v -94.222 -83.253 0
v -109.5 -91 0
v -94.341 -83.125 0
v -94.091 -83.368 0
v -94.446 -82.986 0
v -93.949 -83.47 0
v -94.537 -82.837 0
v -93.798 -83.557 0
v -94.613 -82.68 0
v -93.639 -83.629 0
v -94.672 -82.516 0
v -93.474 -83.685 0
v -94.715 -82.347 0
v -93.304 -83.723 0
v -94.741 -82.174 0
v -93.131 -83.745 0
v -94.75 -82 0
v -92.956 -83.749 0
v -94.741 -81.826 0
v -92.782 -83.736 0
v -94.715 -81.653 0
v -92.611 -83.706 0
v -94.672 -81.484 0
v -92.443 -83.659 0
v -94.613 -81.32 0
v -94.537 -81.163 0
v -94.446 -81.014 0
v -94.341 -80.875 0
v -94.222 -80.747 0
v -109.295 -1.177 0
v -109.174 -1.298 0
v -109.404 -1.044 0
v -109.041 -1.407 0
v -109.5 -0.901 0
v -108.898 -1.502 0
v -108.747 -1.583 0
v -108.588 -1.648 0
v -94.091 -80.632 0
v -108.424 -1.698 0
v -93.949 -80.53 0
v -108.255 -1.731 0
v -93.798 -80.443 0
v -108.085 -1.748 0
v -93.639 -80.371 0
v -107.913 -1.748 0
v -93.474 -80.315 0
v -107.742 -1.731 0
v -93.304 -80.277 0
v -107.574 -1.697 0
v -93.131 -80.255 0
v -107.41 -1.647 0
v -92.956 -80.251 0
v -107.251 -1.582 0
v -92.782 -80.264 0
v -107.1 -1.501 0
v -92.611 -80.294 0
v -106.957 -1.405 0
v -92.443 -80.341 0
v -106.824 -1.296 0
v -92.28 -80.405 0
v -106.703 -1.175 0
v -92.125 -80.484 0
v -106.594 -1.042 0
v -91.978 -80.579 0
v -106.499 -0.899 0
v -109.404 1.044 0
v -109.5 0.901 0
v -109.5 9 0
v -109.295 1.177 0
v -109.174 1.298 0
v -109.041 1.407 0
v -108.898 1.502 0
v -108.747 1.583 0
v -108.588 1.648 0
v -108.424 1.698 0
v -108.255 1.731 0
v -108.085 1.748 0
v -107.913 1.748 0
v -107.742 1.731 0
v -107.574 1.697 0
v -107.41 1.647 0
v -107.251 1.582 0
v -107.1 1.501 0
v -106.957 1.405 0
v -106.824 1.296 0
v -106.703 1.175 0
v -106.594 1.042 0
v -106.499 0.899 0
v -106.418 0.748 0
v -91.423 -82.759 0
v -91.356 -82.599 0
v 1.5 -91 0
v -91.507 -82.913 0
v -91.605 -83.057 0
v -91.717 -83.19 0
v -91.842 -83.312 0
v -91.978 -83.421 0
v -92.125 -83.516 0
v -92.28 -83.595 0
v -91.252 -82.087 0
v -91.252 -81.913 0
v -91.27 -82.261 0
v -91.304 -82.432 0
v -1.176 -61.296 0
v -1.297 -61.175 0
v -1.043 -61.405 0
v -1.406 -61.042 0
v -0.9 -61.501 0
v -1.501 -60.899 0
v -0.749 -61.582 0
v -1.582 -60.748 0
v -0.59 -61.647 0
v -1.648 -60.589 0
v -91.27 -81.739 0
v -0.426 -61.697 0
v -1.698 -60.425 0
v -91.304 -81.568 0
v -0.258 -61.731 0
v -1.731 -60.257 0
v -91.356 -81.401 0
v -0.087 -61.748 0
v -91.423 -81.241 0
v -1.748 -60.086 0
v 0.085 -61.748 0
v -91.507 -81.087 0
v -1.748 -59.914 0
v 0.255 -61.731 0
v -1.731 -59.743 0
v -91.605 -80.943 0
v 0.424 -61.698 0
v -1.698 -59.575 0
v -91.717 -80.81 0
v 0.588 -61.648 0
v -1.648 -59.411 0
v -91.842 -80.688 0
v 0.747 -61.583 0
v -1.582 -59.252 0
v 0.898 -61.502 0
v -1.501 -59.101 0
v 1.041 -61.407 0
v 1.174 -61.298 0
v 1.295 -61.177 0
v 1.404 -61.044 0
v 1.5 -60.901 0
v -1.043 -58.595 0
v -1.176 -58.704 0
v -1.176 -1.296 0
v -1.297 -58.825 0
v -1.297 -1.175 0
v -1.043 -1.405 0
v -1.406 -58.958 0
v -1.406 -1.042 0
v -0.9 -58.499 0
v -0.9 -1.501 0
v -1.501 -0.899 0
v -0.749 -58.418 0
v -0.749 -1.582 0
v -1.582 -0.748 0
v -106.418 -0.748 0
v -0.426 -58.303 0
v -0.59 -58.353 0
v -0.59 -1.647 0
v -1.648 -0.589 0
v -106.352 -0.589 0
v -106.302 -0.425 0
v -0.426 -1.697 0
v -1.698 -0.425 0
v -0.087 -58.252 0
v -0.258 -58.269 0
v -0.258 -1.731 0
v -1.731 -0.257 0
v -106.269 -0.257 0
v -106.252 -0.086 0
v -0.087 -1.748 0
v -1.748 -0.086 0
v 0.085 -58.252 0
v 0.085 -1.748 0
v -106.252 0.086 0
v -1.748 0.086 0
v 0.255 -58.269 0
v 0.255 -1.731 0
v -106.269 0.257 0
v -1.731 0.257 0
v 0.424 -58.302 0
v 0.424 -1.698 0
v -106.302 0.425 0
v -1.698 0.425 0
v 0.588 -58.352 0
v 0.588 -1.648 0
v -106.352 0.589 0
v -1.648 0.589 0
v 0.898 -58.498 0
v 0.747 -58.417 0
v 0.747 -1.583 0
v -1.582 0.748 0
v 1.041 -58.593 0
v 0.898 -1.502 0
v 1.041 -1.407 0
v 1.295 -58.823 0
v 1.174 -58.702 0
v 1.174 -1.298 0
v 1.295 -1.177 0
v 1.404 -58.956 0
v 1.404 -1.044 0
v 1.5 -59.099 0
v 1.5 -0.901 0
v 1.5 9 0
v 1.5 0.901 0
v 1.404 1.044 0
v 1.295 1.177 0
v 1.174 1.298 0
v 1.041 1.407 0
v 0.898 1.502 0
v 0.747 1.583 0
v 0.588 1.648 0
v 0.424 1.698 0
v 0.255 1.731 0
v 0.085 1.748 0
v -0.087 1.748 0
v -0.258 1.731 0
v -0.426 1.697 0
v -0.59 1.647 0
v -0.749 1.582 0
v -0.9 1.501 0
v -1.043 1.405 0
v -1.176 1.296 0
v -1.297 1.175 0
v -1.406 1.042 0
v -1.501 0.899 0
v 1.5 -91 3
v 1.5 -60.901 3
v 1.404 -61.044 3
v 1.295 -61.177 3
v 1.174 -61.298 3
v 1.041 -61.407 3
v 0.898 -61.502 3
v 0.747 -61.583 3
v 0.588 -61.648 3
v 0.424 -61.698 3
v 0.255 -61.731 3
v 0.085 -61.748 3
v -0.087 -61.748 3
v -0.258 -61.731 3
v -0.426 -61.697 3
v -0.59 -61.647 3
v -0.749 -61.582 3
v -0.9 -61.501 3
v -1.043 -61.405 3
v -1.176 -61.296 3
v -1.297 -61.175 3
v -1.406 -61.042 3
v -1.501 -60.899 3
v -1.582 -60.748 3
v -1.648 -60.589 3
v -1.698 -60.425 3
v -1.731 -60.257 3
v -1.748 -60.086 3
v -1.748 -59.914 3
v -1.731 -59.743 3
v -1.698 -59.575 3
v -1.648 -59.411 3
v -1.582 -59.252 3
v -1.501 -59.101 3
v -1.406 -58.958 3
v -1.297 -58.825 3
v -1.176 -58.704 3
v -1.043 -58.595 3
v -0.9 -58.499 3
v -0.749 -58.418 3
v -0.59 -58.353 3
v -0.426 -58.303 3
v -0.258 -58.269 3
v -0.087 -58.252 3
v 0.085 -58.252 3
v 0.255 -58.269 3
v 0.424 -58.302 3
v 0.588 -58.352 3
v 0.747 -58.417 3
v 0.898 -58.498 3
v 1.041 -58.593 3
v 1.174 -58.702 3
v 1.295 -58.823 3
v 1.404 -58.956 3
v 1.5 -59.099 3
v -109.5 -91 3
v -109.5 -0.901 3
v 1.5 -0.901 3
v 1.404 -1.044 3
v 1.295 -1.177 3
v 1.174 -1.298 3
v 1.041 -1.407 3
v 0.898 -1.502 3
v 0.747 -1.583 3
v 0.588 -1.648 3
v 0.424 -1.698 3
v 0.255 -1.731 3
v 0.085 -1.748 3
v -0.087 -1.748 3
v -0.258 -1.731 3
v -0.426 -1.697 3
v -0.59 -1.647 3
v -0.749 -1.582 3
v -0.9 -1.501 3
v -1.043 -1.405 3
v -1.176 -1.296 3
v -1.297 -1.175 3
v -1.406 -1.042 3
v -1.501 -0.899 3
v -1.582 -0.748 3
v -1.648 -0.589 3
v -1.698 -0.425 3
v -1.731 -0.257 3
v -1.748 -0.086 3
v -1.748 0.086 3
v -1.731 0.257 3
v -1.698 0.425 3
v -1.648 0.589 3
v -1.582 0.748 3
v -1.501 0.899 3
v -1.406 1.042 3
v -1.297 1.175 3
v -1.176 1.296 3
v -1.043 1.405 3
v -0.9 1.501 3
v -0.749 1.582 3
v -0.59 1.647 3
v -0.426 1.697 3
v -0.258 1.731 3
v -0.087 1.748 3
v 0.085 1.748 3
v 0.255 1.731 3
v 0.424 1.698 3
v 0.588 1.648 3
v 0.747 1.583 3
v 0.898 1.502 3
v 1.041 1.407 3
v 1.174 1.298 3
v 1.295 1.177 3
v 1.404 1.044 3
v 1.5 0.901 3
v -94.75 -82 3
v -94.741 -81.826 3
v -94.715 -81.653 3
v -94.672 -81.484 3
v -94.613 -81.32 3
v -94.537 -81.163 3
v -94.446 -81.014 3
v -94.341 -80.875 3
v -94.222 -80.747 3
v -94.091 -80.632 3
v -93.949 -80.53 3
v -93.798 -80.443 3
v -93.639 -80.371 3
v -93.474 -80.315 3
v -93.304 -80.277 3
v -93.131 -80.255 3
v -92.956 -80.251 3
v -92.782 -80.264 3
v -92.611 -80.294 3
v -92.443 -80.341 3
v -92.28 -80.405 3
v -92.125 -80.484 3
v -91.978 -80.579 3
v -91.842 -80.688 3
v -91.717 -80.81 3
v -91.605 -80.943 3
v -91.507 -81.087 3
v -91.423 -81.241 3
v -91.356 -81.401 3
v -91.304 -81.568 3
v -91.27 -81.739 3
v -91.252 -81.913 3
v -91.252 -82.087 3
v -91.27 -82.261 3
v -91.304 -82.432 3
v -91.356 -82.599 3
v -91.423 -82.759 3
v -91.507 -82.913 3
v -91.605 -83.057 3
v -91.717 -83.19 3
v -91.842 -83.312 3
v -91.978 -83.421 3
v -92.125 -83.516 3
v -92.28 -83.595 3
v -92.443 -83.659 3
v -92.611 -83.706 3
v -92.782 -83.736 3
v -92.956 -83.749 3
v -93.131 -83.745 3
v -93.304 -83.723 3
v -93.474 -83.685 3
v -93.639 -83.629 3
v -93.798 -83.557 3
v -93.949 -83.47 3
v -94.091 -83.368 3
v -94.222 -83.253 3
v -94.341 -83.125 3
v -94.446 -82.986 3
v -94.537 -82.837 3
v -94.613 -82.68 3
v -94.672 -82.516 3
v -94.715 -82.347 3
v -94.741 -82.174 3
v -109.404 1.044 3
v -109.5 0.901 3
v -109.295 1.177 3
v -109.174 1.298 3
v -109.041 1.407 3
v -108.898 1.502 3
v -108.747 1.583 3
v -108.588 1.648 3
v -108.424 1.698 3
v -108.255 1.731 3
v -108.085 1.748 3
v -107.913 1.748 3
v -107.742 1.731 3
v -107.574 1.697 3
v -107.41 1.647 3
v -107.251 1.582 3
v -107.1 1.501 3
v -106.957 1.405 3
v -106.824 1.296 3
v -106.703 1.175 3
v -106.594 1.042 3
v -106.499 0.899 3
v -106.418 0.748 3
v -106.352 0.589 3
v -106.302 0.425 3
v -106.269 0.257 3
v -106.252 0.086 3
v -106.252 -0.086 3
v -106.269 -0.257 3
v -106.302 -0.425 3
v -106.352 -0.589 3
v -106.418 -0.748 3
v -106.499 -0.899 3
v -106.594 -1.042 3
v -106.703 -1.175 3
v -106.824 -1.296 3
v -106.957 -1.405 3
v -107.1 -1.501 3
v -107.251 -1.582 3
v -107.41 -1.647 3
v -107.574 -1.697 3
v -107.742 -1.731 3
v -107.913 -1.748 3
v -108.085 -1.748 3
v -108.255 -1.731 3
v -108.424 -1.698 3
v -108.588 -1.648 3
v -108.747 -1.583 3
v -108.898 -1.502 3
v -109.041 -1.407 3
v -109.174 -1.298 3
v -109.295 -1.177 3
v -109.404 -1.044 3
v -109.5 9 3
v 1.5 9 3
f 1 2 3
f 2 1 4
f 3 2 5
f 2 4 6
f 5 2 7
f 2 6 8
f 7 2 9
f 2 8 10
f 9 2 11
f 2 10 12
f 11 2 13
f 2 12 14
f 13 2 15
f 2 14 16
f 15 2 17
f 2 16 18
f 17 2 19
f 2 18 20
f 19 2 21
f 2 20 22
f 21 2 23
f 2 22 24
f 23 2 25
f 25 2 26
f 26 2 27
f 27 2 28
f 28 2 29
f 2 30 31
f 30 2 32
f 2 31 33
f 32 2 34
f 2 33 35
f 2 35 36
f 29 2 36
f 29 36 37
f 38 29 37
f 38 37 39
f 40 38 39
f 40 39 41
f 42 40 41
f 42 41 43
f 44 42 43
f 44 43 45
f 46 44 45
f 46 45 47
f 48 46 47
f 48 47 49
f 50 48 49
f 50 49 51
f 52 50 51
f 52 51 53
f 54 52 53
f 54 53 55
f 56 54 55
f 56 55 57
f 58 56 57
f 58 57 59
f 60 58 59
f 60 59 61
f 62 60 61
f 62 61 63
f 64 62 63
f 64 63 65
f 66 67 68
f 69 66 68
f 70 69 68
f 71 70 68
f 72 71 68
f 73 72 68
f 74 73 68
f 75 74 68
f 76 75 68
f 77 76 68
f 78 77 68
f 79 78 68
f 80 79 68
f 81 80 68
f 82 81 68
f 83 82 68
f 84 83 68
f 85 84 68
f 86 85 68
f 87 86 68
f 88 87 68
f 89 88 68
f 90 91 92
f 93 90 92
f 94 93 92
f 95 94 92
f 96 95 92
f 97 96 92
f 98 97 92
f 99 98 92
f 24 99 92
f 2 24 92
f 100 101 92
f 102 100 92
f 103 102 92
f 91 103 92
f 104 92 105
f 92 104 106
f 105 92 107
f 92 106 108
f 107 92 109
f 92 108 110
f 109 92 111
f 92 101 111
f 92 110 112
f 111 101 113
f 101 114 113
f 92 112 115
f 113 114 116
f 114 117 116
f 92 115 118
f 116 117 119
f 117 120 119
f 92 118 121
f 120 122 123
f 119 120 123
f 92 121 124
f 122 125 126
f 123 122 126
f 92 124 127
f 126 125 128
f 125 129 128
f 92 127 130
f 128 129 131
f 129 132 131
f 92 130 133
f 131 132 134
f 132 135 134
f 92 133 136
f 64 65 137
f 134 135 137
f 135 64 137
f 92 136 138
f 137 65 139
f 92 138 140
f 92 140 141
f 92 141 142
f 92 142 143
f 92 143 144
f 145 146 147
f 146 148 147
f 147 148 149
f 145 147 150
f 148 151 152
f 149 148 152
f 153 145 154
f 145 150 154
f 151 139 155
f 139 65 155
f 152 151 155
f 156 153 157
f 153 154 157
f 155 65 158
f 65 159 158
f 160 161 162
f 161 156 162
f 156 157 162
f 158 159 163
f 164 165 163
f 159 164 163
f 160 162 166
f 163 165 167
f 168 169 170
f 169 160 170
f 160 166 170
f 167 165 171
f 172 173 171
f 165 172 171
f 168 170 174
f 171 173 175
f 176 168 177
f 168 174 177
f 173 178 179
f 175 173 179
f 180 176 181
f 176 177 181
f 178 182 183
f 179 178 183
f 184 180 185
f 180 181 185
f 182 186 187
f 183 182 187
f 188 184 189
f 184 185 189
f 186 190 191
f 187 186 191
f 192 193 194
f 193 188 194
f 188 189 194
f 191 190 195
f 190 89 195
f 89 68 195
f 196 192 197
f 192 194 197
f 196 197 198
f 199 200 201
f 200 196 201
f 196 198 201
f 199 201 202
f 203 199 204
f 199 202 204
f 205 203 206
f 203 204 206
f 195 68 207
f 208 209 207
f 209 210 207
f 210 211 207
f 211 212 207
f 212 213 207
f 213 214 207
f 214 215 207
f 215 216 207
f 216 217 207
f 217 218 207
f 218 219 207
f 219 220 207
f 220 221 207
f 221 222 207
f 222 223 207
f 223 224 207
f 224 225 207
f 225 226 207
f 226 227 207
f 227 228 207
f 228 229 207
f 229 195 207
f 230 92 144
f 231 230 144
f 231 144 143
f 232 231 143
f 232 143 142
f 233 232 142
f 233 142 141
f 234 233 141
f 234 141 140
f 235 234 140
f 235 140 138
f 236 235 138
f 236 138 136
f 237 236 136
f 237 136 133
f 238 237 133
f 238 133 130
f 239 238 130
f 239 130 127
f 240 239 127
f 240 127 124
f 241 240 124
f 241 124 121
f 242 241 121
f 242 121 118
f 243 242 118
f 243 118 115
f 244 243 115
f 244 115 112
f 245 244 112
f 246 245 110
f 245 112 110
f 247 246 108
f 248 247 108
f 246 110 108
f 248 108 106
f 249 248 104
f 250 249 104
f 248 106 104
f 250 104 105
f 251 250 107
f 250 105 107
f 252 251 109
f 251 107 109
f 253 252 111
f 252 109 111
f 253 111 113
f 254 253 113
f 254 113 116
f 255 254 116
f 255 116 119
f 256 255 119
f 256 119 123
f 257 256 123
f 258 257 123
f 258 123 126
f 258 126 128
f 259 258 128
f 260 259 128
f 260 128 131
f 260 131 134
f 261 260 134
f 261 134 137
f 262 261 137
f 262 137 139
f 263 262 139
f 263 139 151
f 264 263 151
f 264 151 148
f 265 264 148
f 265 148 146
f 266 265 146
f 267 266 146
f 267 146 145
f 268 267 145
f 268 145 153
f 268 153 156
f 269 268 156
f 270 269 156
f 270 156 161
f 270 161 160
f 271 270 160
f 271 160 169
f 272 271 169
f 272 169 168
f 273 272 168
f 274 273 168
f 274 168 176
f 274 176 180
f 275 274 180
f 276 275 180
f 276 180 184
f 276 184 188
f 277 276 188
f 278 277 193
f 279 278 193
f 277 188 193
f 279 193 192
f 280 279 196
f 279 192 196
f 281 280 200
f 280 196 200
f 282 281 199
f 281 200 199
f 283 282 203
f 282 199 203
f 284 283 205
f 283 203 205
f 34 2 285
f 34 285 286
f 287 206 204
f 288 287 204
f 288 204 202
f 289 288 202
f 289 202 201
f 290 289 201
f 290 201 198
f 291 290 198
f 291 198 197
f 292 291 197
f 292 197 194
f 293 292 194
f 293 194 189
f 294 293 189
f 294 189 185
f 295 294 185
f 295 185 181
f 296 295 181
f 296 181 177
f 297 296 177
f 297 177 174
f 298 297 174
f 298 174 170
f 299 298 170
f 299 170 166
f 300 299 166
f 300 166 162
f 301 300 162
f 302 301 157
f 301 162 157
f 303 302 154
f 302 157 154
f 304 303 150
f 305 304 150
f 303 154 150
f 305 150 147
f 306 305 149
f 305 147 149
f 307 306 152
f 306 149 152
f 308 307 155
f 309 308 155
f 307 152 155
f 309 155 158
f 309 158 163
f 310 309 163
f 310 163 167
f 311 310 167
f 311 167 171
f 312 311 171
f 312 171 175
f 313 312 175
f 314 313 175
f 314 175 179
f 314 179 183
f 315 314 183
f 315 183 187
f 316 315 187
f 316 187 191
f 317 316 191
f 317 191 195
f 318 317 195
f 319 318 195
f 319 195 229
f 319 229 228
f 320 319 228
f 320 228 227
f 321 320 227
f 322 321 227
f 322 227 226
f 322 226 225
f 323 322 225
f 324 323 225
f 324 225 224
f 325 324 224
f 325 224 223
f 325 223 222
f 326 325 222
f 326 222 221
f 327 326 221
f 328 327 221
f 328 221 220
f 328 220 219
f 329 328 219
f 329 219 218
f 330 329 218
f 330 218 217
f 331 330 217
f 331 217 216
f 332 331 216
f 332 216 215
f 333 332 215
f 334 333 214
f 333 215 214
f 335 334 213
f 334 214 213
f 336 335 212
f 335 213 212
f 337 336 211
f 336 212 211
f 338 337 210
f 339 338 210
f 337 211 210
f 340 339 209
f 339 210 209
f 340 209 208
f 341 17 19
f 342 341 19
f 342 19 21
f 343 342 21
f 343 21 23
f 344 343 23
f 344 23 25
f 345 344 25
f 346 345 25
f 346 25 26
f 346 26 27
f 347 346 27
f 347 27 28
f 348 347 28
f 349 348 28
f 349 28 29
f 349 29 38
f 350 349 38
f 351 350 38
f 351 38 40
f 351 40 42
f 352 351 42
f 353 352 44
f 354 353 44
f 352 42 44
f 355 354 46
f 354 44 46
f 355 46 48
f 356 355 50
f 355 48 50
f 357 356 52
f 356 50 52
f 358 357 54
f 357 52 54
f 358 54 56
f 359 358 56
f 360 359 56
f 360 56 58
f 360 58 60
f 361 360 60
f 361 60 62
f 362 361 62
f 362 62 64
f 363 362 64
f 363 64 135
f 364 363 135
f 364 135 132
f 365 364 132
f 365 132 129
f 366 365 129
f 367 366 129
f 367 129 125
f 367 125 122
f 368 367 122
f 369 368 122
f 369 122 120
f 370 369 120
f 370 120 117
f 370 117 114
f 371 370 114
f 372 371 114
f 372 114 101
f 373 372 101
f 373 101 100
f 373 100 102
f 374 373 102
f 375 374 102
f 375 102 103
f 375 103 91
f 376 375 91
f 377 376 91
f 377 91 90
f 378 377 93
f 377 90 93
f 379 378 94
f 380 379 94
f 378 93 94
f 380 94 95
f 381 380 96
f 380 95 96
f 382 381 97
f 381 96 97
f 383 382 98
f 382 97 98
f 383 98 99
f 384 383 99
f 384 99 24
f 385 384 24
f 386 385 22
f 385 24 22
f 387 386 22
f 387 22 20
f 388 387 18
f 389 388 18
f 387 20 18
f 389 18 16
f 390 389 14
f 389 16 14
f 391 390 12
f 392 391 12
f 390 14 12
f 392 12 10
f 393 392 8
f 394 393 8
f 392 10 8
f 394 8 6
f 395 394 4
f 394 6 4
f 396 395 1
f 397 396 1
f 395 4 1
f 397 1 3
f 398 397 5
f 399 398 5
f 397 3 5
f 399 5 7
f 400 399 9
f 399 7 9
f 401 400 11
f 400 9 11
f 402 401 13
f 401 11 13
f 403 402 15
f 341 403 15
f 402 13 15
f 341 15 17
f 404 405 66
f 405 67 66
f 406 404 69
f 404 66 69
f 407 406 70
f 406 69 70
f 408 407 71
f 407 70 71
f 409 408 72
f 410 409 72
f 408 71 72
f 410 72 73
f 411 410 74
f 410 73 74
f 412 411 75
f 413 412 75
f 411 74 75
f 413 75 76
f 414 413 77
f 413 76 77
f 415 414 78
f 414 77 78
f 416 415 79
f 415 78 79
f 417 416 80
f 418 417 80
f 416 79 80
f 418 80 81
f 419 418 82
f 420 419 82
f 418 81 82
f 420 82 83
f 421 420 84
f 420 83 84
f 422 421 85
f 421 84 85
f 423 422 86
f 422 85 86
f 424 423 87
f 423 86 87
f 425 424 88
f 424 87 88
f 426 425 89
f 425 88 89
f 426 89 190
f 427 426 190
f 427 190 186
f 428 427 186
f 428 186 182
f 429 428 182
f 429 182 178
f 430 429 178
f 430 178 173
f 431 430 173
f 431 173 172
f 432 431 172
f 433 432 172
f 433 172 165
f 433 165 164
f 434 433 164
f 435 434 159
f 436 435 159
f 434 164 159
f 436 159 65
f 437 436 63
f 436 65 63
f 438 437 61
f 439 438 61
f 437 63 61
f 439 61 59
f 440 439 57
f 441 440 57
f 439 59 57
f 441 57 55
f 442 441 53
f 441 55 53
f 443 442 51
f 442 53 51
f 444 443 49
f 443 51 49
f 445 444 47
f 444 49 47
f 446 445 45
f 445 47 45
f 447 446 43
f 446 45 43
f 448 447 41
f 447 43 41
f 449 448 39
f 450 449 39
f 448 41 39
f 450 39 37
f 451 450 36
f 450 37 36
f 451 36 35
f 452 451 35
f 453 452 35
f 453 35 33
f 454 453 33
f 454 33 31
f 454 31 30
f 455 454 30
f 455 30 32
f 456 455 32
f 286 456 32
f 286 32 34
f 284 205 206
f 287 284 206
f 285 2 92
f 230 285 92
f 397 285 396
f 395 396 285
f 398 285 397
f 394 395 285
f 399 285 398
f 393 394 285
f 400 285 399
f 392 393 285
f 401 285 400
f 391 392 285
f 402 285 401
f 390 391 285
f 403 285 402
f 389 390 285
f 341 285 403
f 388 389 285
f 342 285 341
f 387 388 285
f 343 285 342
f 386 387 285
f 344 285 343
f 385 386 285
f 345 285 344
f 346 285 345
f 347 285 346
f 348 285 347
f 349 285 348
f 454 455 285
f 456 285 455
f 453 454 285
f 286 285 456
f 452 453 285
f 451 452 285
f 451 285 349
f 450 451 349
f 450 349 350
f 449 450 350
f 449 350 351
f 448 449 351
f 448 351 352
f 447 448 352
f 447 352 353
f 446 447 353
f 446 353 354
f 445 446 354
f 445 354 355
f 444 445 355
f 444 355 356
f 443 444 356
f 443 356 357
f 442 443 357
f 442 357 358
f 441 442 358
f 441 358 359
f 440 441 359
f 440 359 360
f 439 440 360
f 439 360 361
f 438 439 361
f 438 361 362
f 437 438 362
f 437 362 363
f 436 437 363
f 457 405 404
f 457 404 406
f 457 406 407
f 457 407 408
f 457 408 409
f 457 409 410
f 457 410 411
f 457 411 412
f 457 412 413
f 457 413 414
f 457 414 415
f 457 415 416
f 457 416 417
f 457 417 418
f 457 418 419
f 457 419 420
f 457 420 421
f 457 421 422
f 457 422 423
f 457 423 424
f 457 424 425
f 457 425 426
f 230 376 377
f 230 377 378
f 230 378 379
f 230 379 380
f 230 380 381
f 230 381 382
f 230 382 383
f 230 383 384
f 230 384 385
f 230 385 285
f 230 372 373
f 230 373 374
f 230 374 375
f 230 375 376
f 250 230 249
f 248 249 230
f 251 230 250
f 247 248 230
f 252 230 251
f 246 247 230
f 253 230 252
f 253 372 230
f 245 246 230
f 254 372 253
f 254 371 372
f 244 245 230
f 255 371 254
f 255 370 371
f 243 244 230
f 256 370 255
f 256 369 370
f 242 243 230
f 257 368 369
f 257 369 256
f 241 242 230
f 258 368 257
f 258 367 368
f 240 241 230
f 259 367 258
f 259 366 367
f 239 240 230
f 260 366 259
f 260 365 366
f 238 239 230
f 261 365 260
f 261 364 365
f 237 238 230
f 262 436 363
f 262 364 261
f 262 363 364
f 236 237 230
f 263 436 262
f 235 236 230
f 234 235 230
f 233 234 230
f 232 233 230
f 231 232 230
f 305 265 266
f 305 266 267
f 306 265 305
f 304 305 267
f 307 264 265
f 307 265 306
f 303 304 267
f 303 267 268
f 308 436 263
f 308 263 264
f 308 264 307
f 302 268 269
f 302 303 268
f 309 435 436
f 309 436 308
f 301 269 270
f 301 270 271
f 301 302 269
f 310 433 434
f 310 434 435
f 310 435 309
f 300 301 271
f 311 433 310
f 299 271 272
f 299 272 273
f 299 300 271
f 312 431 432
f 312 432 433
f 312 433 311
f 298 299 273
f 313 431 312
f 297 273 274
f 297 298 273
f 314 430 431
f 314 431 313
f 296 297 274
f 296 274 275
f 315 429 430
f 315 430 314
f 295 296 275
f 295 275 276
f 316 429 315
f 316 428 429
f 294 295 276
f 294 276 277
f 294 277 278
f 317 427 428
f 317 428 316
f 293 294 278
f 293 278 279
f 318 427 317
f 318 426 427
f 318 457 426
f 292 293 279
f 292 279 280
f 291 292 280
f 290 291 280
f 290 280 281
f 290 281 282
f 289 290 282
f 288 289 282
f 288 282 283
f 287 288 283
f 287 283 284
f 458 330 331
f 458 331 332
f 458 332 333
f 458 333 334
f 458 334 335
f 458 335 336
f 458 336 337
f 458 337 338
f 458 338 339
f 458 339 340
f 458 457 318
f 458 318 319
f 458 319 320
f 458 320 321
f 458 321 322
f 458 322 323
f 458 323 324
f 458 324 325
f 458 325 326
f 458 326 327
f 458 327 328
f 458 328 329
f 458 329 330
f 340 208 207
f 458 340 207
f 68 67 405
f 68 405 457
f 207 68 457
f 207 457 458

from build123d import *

# Parameters (mm, degrees)
SKETCH1_W                  = 111
SKETCH1_H                  = 100
BOSS_EXTRUDE1_DEPTH        = 3
F_3_5_3_5_DIAMETER_HOLE1_D = 3.5


with BuildPart() as part:
    # Sketch1 → Boss-Extrude1 (new body)
    with BuildSketch(Plane.XY):
        with Locations((-54, -41)):
            Rectangle(SKETCH1_W, SKETCH1_H)
    extrude(amount=BOSS_EXTRUDE1_DEPTH)

    # Ø3.5 (3.5) Diameter Hole1 (through all)
    with Locations(Plane.XY.offset(3)):
        with Locations((0, 0), (-108, 0), (-93, -82), (0, -60)):
            Hole(F_3_5_3_5_DIAMETER_HOLE1_D / 2)


solid = part.part
